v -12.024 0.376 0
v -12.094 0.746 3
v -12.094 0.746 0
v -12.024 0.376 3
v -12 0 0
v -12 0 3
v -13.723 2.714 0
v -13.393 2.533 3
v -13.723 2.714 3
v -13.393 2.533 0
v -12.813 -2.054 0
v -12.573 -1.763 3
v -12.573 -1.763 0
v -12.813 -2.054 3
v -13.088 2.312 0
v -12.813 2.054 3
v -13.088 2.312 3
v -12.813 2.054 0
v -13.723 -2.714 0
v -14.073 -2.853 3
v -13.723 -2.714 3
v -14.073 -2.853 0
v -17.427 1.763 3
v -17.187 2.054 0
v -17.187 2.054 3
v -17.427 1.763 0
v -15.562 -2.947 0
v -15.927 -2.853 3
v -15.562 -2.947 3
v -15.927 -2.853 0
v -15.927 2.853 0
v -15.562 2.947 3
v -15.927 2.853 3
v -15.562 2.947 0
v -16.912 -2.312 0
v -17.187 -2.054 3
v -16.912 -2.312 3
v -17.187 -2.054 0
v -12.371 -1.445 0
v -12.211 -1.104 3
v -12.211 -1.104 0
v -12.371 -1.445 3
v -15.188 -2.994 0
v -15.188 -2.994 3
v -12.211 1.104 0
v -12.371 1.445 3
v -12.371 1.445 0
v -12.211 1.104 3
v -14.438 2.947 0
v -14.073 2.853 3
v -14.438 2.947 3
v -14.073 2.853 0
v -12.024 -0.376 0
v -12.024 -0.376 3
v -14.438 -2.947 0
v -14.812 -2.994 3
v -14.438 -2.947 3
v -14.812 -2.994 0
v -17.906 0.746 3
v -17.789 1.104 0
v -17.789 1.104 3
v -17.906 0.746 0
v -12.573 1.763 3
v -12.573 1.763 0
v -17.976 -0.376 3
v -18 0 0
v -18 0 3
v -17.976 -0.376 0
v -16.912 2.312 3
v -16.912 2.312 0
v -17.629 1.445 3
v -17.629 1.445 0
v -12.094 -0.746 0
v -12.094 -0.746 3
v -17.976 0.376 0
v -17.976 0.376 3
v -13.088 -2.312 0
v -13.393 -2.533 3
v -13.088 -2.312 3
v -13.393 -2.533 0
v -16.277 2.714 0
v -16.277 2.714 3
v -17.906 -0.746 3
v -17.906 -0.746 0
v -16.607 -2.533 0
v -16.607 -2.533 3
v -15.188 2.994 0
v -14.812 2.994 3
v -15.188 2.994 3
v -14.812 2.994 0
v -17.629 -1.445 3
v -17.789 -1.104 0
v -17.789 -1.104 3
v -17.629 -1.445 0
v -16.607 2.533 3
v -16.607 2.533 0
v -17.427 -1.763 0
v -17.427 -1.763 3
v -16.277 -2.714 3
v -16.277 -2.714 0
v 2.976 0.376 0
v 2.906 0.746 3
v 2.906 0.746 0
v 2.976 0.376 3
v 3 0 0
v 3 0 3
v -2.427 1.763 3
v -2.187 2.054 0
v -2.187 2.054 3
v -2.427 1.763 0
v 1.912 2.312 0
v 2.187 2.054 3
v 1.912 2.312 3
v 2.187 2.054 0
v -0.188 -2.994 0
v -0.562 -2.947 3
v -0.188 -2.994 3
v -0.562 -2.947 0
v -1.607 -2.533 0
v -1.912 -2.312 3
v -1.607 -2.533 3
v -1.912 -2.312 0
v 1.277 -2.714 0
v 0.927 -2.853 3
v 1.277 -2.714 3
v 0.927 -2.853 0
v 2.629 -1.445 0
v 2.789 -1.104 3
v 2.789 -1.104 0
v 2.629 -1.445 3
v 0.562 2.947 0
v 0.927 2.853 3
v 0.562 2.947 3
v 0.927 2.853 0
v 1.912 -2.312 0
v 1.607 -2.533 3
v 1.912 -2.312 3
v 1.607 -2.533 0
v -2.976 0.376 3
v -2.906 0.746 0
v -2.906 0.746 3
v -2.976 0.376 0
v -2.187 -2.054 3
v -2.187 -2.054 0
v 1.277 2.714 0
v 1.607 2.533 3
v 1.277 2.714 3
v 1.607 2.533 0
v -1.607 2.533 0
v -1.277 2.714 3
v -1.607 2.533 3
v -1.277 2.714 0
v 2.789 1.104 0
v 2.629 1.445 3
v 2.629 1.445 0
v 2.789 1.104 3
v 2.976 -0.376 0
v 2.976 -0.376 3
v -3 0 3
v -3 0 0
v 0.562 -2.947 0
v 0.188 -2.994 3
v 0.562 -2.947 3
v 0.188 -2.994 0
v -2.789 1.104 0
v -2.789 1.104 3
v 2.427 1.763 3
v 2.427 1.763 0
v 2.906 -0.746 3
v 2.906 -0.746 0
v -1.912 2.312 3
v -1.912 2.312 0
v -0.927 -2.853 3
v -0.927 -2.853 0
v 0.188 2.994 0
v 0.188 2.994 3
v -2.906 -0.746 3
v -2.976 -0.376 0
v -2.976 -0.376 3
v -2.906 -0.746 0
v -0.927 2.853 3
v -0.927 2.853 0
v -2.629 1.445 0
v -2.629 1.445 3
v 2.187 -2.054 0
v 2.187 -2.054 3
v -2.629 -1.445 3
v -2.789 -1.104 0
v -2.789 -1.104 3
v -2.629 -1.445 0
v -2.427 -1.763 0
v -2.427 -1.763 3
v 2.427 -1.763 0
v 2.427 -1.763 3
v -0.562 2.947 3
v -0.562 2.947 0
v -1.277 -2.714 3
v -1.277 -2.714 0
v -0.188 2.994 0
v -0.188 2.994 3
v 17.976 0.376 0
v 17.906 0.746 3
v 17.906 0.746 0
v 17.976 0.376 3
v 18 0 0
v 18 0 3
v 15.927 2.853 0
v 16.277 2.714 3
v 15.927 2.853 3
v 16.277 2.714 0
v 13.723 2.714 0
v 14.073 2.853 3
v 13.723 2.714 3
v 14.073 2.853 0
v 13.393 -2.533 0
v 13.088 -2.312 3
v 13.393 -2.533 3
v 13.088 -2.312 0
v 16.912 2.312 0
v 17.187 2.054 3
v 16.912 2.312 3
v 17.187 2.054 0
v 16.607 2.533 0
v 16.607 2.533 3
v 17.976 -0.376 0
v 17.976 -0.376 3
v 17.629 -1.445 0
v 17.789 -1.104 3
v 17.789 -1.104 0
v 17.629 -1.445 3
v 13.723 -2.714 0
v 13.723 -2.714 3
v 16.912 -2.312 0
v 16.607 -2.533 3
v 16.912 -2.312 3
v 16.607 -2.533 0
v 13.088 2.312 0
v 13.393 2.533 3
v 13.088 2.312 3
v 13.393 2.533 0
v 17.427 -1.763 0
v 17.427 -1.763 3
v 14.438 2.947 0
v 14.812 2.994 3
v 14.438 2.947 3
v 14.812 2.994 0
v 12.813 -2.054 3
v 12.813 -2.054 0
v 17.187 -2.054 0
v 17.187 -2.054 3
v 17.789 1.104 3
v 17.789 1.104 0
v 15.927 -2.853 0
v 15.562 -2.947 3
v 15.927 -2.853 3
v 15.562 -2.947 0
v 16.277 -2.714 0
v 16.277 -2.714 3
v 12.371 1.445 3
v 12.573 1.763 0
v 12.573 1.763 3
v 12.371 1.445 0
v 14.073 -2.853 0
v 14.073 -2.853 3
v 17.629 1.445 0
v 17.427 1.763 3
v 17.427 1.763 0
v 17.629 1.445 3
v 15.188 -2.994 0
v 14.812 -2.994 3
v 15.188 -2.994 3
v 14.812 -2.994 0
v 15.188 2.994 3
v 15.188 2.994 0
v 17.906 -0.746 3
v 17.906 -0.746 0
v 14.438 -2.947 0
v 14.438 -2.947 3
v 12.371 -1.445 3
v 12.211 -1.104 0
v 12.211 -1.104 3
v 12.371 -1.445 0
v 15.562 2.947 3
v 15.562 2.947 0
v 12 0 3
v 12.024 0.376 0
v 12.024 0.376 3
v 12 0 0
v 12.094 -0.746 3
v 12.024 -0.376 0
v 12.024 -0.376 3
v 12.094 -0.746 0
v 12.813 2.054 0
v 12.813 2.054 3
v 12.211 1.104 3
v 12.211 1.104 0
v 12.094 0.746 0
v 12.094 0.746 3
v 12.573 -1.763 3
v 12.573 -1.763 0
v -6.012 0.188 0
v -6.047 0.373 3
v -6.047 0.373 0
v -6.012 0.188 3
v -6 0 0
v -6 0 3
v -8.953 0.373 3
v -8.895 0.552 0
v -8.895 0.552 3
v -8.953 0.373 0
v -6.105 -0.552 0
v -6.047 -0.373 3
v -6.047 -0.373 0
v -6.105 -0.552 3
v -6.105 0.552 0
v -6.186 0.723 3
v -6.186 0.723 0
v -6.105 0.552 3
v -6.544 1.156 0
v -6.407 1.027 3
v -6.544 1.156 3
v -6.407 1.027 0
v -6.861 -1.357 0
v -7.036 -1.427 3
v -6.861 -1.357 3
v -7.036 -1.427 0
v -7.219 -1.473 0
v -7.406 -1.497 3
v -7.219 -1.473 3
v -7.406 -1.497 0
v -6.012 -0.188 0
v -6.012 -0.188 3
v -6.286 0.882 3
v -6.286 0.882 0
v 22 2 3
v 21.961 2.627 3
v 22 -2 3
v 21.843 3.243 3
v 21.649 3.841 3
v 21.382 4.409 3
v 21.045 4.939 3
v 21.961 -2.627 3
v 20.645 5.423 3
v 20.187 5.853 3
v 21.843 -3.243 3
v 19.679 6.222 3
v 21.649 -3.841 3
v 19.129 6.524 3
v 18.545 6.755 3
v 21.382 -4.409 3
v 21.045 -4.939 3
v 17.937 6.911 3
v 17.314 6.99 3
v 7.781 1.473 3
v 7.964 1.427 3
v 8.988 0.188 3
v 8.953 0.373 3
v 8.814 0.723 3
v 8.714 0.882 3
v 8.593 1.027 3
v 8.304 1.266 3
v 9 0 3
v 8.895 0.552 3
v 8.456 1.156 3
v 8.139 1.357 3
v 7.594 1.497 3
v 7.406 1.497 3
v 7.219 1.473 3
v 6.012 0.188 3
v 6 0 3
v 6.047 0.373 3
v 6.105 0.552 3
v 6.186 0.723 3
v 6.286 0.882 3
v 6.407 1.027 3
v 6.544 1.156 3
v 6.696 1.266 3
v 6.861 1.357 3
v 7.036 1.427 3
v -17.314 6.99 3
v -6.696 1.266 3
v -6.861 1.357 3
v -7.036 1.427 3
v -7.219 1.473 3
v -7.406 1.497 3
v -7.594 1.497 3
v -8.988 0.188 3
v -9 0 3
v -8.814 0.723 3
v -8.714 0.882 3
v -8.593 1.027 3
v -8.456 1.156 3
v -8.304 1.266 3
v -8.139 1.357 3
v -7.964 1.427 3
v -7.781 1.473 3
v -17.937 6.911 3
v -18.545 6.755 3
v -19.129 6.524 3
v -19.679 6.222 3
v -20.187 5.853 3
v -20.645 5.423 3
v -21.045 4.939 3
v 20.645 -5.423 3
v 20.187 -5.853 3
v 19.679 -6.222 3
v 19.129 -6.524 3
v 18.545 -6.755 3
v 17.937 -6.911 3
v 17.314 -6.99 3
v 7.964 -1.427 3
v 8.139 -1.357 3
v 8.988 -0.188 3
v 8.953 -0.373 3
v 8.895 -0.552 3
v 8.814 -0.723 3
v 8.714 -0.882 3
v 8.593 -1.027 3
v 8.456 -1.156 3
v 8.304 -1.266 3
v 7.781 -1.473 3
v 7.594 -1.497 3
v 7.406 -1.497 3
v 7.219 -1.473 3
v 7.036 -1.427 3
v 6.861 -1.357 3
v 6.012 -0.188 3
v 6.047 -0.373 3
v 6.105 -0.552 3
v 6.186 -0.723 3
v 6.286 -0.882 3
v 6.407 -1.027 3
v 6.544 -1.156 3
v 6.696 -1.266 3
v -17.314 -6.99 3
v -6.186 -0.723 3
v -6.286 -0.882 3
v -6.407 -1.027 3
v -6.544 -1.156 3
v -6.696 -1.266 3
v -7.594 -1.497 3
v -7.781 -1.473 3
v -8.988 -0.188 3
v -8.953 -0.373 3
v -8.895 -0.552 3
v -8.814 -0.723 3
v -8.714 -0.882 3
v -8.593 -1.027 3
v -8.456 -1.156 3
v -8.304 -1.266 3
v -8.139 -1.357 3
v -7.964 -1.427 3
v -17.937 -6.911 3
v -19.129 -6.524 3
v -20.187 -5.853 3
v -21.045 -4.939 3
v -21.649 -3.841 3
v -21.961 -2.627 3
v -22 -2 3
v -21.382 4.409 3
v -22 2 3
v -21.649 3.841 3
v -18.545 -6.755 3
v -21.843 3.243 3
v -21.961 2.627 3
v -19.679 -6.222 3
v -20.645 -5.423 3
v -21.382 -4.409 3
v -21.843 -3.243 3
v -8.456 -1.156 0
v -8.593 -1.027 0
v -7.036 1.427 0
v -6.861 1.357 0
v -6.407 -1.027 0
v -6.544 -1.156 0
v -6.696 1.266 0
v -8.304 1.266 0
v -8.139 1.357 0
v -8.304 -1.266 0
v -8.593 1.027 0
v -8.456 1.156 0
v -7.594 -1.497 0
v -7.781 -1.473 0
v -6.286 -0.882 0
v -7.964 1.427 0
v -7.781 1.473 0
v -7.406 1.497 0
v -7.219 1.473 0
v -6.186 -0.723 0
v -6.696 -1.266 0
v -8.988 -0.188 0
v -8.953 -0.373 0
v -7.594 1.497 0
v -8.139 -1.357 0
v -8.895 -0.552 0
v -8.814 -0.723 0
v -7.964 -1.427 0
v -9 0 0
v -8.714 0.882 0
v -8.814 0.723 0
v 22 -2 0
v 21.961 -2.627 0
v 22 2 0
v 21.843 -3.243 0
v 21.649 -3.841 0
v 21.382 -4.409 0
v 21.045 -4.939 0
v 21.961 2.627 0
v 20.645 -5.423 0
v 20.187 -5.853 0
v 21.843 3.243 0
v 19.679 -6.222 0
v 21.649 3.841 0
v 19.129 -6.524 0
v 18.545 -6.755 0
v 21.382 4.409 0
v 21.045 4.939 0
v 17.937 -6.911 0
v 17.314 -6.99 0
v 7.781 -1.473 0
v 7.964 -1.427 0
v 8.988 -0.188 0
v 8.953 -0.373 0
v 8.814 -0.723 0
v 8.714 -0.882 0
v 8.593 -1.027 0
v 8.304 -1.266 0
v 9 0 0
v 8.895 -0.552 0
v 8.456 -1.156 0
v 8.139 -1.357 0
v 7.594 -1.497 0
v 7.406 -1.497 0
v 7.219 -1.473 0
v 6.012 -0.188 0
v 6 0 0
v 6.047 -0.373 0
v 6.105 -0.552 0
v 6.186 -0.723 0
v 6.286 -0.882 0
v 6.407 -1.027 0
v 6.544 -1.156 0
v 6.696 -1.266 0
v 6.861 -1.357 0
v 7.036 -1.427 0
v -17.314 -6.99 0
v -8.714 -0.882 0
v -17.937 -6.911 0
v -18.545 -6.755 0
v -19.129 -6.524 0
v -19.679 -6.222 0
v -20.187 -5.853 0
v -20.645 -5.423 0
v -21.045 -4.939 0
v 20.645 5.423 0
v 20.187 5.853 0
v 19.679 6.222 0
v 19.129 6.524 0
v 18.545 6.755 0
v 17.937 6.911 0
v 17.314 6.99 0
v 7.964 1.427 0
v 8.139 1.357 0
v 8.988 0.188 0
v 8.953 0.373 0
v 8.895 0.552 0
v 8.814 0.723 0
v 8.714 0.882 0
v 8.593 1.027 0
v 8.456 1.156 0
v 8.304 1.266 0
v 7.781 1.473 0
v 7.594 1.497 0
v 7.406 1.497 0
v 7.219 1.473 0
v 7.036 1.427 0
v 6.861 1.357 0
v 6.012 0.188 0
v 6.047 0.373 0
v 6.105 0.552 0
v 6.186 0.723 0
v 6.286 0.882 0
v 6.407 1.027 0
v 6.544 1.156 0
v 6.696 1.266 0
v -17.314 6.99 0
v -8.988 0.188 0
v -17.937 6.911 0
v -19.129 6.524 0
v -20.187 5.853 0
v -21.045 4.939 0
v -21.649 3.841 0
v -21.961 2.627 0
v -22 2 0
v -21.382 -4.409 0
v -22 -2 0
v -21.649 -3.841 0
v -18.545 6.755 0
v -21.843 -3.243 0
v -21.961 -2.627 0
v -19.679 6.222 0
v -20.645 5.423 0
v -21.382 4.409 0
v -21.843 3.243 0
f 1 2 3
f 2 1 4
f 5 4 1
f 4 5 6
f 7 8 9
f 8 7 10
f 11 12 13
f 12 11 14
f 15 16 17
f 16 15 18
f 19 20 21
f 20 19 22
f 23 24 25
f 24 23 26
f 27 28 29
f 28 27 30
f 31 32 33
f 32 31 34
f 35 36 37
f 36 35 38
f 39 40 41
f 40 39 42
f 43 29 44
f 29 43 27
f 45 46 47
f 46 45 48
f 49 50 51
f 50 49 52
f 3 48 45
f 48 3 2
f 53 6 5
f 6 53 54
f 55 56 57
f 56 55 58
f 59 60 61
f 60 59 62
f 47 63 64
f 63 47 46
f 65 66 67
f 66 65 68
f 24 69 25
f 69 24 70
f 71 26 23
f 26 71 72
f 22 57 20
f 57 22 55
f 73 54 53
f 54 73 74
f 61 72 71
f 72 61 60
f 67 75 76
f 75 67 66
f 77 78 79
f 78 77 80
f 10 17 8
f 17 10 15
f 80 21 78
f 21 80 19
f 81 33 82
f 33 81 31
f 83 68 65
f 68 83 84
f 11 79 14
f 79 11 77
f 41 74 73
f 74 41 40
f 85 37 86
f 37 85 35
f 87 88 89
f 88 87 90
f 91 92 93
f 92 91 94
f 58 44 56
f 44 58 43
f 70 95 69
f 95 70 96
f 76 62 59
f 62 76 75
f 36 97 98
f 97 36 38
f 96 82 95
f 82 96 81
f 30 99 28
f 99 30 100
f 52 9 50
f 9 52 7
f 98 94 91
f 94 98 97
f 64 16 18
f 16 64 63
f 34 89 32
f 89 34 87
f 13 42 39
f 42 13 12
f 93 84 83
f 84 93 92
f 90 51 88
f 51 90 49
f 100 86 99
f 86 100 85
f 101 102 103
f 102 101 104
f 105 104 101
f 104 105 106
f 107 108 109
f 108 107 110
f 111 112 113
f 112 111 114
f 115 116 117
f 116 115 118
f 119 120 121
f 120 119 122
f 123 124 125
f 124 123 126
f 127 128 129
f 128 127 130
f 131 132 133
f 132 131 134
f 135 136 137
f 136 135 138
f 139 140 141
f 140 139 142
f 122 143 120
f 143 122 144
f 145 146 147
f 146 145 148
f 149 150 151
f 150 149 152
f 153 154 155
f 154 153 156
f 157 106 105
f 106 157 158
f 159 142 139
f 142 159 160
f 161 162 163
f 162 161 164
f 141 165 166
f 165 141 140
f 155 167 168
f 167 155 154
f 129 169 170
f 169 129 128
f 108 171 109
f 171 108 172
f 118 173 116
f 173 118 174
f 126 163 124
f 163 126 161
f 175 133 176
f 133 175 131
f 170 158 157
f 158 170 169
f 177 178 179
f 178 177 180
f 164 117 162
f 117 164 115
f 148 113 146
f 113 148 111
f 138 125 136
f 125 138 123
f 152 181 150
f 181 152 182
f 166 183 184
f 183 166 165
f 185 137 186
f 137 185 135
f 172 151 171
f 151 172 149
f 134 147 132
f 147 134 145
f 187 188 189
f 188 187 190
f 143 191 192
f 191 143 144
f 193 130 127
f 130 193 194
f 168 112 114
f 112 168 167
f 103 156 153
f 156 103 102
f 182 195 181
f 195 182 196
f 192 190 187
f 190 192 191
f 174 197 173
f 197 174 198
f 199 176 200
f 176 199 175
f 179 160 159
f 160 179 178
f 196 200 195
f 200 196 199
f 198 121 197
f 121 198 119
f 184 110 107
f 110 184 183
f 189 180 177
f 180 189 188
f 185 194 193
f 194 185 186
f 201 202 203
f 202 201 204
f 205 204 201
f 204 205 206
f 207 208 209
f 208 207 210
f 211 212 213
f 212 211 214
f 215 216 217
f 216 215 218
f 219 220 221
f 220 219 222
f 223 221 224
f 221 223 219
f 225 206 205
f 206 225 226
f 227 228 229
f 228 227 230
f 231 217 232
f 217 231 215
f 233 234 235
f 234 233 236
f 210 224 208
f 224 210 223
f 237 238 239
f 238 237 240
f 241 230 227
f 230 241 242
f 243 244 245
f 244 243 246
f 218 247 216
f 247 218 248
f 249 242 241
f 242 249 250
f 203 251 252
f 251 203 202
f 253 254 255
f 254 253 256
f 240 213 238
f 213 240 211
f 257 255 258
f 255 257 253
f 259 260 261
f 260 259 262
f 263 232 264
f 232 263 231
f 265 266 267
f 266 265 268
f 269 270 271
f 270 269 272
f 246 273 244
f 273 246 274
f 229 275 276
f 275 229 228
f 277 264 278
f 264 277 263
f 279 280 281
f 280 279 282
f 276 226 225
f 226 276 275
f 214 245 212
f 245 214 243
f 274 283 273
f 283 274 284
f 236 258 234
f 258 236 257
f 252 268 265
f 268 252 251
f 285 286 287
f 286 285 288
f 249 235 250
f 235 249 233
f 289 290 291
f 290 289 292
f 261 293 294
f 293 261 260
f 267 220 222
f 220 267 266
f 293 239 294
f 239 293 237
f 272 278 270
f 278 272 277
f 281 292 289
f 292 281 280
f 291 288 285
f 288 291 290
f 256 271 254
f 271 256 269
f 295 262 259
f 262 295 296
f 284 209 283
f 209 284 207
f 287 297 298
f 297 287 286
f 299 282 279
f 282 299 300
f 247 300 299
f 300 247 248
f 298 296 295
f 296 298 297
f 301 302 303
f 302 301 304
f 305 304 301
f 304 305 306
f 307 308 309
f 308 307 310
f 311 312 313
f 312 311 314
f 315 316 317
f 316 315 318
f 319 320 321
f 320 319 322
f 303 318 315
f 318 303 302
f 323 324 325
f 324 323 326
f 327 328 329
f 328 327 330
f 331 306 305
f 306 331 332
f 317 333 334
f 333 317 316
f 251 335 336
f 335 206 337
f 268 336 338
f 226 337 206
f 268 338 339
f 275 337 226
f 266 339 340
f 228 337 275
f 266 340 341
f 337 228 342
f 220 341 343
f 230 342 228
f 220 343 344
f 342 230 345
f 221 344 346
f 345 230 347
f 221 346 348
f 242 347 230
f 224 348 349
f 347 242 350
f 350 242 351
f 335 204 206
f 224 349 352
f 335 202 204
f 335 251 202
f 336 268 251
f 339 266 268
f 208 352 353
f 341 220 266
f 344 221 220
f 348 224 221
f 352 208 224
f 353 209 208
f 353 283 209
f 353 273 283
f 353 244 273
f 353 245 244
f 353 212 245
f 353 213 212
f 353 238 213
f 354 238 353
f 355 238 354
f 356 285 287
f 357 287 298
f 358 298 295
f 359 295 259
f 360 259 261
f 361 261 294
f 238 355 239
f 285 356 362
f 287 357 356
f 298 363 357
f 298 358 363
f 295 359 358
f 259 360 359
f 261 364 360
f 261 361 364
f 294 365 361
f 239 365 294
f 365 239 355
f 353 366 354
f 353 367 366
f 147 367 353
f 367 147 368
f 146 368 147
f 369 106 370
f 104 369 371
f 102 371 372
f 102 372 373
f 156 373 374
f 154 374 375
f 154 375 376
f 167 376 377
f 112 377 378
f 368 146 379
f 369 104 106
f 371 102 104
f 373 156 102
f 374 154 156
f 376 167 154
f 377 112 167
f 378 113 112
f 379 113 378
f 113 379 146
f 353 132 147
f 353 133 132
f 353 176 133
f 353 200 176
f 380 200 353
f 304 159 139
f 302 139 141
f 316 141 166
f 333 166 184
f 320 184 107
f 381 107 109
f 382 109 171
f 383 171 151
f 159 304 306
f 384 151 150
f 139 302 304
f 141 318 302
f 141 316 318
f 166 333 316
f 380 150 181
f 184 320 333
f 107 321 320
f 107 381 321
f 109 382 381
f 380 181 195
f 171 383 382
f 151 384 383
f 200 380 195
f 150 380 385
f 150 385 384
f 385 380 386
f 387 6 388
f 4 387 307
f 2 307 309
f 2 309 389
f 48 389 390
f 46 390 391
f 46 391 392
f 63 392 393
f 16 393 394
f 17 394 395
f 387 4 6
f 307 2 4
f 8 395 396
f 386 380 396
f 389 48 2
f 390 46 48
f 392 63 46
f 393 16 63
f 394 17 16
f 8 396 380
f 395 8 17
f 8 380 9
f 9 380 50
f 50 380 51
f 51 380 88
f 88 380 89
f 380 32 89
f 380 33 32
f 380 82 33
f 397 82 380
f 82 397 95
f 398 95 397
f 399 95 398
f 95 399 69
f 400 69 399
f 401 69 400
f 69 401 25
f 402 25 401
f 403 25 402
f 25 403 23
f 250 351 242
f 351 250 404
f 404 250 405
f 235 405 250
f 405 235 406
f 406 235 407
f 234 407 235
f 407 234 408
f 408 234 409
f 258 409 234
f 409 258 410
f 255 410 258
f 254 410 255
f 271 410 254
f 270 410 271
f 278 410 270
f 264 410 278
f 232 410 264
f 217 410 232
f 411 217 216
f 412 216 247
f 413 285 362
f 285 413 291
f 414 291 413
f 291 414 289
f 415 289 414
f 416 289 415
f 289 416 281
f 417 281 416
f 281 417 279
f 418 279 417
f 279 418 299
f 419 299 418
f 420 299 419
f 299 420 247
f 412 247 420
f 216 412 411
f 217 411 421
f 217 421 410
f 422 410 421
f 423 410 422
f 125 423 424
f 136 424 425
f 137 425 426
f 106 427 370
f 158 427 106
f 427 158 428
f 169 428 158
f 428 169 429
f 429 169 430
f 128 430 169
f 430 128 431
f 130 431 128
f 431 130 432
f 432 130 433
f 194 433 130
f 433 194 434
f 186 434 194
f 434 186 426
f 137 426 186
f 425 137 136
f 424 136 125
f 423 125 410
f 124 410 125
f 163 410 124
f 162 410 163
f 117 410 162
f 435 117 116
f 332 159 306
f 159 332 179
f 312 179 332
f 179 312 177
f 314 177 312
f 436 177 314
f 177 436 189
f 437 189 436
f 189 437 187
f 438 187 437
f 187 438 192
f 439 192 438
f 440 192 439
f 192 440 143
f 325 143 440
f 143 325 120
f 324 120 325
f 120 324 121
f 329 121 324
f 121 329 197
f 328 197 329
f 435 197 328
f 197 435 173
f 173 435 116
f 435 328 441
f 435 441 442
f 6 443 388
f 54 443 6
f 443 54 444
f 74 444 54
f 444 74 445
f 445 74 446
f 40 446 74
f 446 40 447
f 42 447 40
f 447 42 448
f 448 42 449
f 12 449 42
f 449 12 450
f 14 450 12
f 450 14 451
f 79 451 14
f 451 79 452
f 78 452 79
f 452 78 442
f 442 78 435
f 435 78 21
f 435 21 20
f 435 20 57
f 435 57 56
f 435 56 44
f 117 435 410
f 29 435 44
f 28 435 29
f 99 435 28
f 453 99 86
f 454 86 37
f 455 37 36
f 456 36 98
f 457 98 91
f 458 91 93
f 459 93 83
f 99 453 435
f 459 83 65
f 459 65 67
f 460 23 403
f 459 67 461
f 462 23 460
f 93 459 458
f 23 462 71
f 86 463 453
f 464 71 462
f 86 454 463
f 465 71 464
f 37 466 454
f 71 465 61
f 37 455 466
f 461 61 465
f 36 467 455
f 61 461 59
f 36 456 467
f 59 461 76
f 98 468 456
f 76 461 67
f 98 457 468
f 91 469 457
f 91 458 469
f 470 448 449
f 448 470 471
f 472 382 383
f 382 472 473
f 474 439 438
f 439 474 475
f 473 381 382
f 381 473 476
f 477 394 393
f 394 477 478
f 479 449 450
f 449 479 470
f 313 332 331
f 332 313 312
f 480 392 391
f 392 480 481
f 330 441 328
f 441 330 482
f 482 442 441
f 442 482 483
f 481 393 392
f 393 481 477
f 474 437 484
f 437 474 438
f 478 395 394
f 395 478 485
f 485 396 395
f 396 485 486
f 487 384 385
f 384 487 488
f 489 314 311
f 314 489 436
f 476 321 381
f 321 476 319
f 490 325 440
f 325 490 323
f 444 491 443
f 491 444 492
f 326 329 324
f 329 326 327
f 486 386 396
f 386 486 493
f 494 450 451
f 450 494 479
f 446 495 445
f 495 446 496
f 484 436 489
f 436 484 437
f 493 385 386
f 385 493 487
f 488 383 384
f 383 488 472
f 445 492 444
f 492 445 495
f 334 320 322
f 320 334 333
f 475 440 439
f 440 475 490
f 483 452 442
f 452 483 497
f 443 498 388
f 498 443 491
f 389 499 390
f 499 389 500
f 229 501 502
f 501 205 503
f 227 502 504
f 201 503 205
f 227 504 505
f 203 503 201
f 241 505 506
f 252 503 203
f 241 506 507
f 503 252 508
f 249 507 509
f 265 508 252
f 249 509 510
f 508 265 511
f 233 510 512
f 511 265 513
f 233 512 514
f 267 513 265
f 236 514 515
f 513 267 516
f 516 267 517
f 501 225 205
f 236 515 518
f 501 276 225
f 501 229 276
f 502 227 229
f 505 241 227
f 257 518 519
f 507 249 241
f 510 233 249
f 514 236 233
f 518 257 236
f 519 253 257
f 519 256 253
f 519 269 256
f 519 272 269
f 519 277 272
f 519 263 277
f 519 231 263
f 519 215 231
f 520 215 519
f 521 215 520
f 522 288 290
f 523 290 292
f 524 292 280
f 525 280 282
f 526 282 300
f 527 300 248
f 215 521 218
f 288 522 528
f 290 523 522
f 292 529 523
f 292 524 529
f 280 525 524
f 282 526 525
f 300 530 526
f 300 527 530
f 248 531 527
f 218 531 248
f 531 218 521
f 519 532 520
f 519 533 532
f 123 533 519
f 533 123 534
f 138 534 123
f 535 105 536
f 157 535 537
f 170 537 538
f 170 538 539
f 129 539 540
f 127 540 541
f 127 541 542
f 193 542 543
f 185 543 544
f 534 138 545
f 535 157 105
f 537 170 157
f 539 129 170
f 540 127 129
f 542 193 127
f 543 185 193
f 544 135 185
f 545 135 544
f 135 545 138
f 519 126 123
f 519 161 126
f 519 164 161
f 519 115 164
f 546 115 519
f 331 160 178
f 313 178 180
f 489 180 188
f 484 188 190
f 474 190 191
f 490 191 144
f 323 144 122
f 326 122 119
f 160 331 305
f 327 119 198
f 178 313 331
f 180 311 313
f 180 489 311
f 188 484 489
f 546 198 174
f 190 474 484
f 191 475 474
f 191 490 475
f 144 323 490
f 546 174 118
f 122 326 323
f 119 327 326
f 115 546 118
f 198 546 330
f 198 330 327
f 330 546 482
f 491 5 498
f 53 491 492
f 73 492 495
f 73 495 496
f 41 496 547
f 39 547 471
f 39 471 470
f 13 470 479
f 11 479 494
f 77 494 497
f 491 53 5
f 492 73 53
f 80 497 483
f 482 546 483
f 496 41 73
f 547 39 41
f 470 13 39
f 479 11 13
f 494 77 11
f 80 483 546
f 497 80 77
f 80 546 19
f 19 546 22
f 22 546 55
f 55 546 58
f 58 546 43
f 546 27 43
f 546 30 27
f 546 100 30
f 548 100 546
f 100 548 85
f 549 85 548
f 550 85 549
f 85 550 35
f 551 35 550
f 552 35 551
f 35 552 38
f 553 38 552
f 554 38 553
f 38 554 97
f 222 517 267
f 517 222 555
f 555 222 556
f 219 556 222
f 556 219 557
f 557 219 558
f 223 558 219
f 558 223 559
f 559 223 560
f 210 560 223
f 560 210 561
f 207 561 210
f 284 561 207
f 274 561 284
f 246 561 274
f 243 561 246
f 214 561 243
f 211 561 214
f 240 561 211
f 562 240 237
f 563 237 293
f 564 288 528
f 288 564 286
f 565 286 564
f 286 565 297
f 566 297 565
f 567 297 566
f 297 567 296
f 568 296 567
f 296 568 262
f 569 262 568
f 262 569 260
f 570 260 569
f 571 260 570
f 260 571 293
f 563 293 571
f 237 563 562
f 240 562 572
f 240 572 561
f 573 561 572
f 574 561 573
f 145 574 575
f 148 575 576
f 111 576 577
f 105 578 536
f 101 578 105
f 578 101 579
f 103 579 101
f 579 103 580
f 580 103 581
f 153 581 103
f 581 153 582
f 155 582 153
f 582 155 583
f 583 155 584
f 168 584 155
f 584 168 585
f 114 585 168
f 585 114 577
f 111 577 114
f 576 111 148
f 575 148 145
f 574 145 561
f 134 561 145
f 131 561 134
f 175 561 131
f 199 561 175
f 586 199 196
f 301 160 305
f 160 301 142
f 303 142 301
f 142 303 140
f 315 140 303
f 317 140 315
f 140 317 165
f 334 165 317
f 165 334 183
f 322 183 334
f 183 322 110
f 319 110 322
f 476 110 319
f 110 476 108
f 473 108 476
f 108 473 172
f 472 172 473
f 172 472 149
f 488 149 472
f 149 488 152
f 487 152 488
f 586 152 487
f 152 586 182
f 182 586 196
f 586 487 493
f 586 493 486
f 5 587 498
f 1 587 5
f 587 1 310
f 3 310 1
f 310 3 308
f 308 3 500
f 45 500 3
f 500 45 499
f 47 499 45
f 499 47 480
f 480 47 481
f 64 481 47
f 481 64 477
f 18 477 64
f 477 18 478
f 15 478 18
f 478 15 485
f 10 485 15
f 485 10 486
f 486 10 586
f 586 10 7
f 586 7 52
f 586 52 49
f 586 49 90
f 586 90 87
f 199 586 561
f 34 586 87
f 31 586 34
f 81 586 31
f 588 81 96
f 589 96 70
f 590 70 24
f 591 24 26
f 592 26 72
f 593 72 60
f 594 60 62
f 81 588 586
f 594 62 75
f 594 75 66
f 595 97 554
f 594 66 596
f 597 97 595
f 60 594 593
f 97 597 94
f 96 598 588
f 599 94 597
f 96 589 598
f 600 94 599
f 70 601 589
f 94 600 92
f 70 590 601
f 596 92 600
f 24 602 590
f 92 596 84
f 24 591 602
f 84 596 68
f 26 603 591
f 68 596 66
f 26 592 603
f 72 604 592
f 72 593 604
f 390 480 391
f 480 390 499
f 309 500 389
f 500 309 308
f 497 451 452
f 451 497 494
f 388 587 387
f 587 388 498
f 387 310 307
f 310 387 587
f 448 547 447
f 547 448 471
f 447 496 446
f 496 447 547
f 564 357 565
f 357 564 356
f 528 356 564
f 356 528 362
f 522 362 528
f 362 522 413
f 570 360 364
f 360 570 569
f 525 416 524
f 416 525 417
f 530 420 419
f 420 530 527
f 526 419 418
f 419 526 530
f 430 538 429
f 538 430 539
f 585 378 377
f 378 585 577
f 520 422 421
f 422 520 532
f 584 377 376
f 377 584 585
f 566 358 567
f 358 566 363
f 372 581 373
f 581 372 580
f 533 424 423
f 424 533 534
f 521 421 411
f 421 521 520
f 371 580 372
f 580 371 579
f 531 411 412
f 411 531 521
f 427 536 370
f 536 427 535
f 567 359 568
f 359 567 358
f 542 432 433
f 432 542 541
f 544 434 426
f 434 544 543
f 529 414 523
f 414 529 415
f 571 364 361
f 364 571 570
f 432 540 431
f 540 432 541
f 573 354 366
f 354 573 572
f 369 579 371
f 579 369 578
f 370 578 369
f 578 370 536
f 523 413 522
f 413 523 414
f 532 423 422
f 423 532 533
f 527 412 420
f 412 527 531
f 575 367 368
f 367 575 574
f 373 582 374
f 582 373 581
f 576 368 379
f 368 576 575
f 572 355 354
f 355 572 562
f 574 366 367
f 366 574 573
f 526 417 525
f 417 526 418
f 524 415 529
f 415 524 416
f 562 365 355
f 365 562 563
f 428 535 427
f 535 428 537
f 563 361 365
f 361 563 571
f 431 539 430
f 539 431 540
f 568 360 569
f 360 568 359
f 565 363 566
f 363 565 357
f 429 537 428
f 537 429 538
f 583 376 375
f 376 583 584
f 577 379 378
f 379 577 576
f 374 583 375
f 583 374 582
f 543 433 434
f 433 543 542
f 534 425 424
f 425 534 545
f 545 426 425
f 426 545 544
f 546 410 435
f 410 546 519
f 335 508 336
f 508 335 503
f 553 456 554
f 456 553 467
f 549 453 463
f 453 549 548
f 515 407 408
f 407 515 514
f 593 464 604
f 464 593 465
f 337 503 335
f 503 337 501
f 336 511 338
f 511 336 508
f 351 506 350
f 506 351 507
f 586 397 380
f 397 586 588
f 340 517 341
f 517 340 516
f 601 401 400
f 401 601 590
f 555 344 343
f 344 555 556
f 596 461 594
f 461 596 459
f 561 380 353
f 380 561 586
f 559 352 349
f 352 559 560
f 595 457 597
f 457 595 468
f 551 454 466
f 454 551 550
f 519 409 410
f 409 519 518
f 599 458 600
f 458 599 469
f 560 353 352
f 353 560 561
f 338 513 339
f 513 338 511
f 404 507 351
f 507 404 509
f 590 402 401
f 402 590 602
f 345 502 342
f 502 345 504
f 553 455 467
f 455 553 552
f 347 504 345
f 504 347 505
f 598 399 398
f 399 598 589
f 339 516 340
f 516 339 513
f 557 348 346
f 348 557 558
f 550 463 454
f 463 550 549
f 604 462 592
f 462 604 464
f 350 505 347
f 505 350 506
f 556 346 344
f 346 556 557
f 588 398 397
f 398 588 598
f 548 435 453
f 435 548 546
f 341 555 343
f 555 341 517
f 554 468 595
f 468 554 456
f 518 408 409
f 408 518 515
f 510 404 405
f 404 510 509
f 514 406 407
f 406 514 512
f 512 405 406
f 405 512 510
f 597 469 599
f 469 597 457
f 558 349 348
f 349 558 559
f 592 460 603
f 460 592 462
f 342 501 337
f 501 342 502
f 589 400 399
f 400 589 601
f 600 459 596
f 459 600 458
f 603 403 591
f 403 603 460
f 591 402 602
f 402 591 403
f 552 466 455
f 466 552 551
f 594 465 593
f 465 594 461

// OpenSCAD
$fn = 50;


difference() {
	union() {
		hull() {
			translate(v = [-17.0000000000, 2.0000000000, 0]) {
				cylinder(h = 3, r = 5);
			}
			translate(v = [17.0000000000, 2.0000000000, 0]) {
				cylinder(h = 3, r = 5);
			}
			translate(v = [-17.0000000000, -2.0000000000, 0]) {
				cylinder(h = 3, r = 5);
			}
			translate(v = [17.0000000000, -2.0000000000, 0]) {
				cylinder(h = 3, r = 5);
			}
		}
	}
	union() {
		translate(v = [-15.0000000000, 0.0000000000, -100.0000000000]) {
			cylinder(h = 200, r = 3.0000000000);
		}
		translate(v = [0.0000000000, 0.0000000000, -100.0000000000]) {
			cylinder(h = 200, r = 3.0000000000);
		}
		translate(v = [15.0000000000, 0.0000000000, -100.0000000000]) {
			cylinder(h = 200, r = 3.0000000000);
		}
		translate(v = [-15.0000000000, 0.0000000000, 0]) {
			cylinder(h = 3, r = 1.5000000000);
		}
		translate(v = [-7.5000000000, 0.0000000000, 0]) {
			cylinder(h = 3, r = 1.5000000000);
		}
		cylinder(h = 3, r = 1.5000000000);
		translate(v = [7.5000000000, 0.0000000000, 0]) {
			cylinder(h = 3, r = 1.5000000000);
		}
		translate(v = [15.0000000000, 0.0000000000, 0]) {
			cylinder(h = 3, r = 1.5000000000);
		}
		translate(v = [-15.0000000000, 0.0000000000, 0]) {
			cylinder(h = 3, r = 1.5000000000);
		}
		translate(v = [-7.5000000000, 0.0000000000, 0]) {
			cylinder(h = 3, r = 1.5000000000);
		}
		cylinder(h = 3, r = 1.5000000000);
		translate(v = [7.5000000000, 0.0000000000, 0]) {
			cylinder(h = 3, r = 1.5000000000);
		}
		translate(v = [15.0000000000, 0.0000000000, 0]) {
			cylinder(h = 3, r = 1.5000000000);
		}
		translate(v = [-15.0000000000, 0.0000000000, 0]) {
			cylinder(h = 3, r = 1.5000000000);
		}
		translate(v = [-7.5000000000, 0.0000000000, 0]) {
			cylinder(h = 3, r = 1.5000000000);
		}
		cylinder(h = 3, r = 1.5000000000);
		translate(v = [7.5000000000, 0.0000000000, 0]) {
			cylinder(h = 3, r = 1.5000000000);
		}
		translate(v = [15.0000000000, 0.0000000000, 0]) {
			cylinder(h = 3, r = 1.5000000000);
		}
	}
}
